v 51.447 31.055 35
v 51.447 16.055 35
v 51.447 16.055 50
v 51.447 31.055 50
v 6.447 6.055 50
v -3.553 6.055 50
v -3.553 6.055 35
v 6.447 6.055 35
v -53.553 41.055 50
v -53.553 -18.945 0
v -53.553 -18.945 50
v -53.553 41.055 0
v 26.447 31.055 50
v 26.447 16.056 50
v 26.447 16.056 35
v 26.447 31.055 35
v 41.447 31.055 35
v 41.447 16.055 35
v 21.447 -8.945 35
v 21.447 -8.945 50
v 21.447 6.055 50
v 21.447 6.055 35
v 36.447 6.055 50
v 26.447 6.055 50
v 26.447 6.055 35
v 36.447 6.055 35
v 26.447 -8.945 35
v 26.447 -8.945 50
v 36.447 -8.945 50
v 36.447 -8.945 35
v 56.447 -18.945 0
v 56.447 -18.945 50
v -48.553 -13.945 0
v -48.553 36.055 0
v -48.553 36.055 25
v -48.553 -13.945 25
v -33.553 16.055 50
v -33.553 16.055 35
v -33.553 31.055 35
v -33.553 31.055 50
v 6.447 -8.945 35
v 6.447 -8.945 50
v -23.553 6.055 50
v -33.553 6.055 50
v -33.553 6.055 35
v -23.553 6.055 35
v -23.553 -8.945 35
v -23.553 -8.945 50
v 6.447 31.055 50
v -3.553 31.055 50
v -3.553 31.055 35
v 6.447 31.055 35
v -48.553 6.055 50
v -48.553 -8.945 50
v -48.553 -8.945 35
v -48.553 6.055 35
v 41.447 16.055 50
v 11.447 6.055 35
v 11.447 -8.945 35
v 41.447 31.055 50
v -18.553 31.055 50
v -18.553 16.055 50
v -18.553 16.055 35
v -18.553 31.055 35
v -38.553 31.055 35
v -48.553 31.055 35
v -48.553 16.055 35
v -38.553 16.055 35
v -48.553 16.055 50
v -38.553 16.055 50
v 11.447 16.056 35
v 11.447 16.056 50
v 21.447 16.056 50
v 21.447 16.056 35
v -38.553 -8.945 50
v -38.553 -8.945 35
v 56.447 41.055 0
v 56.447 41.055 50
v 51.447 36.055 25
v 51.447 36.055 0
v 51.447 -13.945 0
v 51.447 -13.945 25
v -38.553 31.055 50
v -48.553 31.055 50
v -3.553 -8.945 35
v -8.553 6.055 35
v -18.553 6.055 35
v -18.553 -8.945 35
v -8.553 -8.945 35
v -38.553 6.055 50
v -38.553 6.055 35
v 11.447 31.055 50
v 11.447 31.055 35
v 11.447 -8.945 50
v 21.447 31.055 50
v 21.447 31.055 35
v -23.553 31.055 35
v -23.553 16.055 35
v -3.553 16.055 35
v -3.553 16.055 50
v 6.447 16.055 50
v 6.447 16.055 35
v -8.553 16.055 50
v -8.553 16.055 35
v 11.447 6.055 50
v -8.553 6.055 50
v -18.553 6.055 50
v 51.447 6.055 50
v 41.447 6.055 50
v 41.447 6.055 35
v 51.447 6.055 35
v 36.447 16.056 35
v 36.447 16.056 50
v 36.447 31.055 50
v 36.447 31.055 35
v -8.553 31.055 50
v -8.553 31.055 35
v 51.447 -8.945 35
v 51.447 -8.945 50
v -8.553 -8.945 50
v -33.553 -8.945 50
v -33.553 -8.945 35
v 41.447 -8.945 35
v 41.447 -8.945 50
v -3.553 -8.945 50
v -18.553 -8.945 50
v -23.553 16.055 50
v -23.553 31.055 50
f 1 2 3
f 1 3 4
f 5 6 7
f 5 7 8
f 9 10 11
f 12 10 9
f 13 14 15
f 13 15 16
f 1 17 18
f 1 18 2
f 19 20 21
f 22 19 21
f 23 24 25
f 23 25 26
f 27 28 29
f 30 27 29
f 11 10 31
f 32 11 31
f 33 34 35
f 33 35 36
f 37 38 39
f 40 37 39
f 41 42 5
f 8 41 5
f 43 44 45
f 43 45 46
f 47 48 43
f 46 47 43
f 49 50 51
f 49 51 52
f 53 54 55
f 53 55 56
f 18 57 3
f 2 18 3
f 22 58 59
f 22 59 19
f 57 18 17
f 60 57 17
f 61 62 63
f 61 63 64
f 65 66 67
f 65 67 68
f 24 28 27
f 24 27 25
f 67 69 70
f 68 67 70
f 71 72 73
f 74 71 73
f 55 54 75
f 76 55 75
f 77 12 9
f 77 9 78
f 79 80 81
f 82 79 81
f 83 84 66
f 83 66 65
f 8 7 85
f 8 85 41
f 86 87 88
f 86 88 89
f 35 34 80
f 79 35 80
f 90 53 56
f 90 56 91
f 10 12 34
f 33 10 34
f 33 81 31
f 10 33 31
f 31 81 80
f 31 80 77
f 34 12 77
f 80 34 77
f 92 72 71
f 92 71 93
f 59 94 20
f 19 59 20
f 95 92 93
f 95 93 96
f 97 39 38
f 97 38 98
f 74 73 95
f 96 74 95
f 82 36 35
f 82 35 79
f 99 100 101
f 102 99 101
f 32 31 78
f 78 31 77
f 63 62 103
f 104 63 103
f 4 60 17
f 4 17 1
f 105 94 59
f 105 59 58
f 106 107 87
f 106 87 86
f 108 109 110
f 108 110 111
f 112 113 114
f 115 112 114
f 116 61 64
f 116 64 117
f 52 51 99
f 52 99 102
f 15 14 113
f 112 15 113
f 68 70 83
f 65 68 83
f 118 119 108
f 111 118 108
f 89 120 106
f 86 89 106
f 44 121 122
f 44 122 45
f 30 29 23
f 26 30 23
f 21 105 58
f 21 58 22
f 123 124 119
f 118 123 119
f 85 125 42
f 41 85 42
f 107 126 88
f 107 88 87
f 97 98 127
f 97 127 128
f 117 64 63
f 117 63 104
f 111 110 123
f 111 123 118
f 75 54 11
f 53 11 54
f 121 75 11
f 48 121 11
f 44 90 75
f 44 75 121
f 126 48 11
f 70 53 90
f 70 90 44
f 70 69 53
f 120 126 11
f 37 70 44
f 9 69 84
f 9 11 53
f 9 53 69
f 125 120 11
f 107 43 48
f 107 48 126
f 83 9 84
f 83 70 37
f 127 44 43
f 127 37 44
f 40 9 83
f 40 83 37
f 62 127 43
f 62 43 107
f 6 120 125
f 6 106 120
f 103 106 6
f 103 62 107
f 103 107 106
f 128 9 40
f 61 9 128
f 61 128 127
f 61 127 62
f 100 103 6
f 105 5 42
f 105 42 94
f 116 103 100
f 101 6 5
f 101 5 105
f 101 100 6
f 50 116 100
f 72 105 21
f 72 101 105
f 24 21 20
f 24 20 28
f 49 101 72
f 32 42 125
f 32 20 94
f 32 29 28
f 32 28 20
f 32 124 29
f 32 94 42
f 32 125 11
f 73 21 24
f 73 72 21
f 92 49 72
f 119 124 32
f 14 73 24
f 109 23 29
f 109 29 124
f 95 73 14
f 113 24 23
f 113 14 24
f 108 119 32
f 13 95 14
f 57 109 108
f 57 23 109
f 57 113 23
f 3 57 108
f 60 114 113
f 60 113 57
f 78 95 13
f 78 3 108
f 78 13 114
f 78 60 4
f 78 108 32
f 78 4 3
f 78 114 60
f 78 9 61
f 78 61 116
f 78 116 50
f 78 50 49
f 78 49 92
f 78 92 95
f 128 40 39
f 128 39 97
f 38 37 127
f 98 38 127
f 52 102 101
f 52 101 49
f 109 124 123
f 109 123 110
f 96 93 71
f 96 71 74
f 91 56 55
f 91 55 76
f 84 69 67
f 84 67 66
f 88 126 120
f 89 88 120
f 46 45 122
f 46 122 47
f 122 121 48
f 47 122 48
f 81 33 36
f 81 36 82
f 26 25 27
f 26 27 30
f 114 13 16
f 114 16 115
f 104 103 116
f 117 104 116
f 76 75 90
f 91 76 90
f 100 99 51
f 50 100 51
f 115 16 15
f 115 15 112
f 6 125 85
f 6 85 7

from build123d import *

# Parameters (mm, degrees)
F0_W     = 110
F0_H     = 60
F1_DEPTH = 50
F2_W     = 100
F2_H     = 50
F3_DEPTH = 25
F5_W     = 10
F5_H     = 15
F5_H_2   = 14.999788
F5_H_3   = 14.999776
F5_H_4   = 14.999488
F5_H_5   = 14.999479
F5_H_6   = 14.999535
F6_DEPTH = 15


with BuildPart() as f1:
    # F0 (on Top) → F1 (new body)
    with BuildSketch(Plane.XY):
        with Locations((1.447366, 11.055018)):
            Rectangle(F0_W, F0_H)
    extrude(amount=F1_DEPTH)

    # F2 (on face) → F3 (cut)
    with BuildSketch(Plane(origin=(0, 0, 0), x_dir=(1, 0, 0), z_dir=(0, 0, -1))):
        with Locations((1.447366, -11.055018)):
            Rectangle(F2_W, F2_H)
    extrude(amount=-F3_DEPTH, mode=Mode.SUBTRACT)

    # F5 (on face) → F6 (cut)
    with BuildSketch(Plane.XY.offset(50)):
        with Locations((-43.552634, 23.555018)):
            Rectangle(F5_W, F5_H)
        with Locations((-28.552634, 23.555124)):
            Rectangle(F5_W, F5_H_2)
        with Locations((-13.552634, 23.555018)):
            Rectangle(F5_W, F5_H)
        with Locations((1.447366, 23.55513)):
            Rectangle(F5_W, F5_H_3)
        with Locations((16.447366, 23.555274)):
            Rectangle(F5_W, F5_H_4)
        with Locations((31.447366, 23.555279)):
            Rectangle(F5_W, F5_H_5)
        with Locations((46.447366, 23.55525)):
            Rectangle(F5_W, F5_H_6)
        with Locations((-43.552634, -1.444982)):
            Rectangle(F5_W, F5_H)
        with Locations((-28.552634, -1.444982)):
            Rectangle(F5_W, F5_H)
        with Locations((-13.552634, -1.444982)):
            Rectangle(F5_W, F5_H)
        with Locations((1.447366, -1.444982)):
            Rectangle(F5_W, F5_H)
        with Locations((16.447366, -1.444982)):
            Rectangle(F5_W, F5_H)
        with Locations((31.447366, -1.444982)):
            Rectangle(F5_W, F5_H)
        with Locations((46.447366, -1.444982)):
            Rectangle(F5_W, F5_H)
    extrude(amount=-F6_DEPTH, mode=Mode.SUBTRACT)


solid = f1.part
